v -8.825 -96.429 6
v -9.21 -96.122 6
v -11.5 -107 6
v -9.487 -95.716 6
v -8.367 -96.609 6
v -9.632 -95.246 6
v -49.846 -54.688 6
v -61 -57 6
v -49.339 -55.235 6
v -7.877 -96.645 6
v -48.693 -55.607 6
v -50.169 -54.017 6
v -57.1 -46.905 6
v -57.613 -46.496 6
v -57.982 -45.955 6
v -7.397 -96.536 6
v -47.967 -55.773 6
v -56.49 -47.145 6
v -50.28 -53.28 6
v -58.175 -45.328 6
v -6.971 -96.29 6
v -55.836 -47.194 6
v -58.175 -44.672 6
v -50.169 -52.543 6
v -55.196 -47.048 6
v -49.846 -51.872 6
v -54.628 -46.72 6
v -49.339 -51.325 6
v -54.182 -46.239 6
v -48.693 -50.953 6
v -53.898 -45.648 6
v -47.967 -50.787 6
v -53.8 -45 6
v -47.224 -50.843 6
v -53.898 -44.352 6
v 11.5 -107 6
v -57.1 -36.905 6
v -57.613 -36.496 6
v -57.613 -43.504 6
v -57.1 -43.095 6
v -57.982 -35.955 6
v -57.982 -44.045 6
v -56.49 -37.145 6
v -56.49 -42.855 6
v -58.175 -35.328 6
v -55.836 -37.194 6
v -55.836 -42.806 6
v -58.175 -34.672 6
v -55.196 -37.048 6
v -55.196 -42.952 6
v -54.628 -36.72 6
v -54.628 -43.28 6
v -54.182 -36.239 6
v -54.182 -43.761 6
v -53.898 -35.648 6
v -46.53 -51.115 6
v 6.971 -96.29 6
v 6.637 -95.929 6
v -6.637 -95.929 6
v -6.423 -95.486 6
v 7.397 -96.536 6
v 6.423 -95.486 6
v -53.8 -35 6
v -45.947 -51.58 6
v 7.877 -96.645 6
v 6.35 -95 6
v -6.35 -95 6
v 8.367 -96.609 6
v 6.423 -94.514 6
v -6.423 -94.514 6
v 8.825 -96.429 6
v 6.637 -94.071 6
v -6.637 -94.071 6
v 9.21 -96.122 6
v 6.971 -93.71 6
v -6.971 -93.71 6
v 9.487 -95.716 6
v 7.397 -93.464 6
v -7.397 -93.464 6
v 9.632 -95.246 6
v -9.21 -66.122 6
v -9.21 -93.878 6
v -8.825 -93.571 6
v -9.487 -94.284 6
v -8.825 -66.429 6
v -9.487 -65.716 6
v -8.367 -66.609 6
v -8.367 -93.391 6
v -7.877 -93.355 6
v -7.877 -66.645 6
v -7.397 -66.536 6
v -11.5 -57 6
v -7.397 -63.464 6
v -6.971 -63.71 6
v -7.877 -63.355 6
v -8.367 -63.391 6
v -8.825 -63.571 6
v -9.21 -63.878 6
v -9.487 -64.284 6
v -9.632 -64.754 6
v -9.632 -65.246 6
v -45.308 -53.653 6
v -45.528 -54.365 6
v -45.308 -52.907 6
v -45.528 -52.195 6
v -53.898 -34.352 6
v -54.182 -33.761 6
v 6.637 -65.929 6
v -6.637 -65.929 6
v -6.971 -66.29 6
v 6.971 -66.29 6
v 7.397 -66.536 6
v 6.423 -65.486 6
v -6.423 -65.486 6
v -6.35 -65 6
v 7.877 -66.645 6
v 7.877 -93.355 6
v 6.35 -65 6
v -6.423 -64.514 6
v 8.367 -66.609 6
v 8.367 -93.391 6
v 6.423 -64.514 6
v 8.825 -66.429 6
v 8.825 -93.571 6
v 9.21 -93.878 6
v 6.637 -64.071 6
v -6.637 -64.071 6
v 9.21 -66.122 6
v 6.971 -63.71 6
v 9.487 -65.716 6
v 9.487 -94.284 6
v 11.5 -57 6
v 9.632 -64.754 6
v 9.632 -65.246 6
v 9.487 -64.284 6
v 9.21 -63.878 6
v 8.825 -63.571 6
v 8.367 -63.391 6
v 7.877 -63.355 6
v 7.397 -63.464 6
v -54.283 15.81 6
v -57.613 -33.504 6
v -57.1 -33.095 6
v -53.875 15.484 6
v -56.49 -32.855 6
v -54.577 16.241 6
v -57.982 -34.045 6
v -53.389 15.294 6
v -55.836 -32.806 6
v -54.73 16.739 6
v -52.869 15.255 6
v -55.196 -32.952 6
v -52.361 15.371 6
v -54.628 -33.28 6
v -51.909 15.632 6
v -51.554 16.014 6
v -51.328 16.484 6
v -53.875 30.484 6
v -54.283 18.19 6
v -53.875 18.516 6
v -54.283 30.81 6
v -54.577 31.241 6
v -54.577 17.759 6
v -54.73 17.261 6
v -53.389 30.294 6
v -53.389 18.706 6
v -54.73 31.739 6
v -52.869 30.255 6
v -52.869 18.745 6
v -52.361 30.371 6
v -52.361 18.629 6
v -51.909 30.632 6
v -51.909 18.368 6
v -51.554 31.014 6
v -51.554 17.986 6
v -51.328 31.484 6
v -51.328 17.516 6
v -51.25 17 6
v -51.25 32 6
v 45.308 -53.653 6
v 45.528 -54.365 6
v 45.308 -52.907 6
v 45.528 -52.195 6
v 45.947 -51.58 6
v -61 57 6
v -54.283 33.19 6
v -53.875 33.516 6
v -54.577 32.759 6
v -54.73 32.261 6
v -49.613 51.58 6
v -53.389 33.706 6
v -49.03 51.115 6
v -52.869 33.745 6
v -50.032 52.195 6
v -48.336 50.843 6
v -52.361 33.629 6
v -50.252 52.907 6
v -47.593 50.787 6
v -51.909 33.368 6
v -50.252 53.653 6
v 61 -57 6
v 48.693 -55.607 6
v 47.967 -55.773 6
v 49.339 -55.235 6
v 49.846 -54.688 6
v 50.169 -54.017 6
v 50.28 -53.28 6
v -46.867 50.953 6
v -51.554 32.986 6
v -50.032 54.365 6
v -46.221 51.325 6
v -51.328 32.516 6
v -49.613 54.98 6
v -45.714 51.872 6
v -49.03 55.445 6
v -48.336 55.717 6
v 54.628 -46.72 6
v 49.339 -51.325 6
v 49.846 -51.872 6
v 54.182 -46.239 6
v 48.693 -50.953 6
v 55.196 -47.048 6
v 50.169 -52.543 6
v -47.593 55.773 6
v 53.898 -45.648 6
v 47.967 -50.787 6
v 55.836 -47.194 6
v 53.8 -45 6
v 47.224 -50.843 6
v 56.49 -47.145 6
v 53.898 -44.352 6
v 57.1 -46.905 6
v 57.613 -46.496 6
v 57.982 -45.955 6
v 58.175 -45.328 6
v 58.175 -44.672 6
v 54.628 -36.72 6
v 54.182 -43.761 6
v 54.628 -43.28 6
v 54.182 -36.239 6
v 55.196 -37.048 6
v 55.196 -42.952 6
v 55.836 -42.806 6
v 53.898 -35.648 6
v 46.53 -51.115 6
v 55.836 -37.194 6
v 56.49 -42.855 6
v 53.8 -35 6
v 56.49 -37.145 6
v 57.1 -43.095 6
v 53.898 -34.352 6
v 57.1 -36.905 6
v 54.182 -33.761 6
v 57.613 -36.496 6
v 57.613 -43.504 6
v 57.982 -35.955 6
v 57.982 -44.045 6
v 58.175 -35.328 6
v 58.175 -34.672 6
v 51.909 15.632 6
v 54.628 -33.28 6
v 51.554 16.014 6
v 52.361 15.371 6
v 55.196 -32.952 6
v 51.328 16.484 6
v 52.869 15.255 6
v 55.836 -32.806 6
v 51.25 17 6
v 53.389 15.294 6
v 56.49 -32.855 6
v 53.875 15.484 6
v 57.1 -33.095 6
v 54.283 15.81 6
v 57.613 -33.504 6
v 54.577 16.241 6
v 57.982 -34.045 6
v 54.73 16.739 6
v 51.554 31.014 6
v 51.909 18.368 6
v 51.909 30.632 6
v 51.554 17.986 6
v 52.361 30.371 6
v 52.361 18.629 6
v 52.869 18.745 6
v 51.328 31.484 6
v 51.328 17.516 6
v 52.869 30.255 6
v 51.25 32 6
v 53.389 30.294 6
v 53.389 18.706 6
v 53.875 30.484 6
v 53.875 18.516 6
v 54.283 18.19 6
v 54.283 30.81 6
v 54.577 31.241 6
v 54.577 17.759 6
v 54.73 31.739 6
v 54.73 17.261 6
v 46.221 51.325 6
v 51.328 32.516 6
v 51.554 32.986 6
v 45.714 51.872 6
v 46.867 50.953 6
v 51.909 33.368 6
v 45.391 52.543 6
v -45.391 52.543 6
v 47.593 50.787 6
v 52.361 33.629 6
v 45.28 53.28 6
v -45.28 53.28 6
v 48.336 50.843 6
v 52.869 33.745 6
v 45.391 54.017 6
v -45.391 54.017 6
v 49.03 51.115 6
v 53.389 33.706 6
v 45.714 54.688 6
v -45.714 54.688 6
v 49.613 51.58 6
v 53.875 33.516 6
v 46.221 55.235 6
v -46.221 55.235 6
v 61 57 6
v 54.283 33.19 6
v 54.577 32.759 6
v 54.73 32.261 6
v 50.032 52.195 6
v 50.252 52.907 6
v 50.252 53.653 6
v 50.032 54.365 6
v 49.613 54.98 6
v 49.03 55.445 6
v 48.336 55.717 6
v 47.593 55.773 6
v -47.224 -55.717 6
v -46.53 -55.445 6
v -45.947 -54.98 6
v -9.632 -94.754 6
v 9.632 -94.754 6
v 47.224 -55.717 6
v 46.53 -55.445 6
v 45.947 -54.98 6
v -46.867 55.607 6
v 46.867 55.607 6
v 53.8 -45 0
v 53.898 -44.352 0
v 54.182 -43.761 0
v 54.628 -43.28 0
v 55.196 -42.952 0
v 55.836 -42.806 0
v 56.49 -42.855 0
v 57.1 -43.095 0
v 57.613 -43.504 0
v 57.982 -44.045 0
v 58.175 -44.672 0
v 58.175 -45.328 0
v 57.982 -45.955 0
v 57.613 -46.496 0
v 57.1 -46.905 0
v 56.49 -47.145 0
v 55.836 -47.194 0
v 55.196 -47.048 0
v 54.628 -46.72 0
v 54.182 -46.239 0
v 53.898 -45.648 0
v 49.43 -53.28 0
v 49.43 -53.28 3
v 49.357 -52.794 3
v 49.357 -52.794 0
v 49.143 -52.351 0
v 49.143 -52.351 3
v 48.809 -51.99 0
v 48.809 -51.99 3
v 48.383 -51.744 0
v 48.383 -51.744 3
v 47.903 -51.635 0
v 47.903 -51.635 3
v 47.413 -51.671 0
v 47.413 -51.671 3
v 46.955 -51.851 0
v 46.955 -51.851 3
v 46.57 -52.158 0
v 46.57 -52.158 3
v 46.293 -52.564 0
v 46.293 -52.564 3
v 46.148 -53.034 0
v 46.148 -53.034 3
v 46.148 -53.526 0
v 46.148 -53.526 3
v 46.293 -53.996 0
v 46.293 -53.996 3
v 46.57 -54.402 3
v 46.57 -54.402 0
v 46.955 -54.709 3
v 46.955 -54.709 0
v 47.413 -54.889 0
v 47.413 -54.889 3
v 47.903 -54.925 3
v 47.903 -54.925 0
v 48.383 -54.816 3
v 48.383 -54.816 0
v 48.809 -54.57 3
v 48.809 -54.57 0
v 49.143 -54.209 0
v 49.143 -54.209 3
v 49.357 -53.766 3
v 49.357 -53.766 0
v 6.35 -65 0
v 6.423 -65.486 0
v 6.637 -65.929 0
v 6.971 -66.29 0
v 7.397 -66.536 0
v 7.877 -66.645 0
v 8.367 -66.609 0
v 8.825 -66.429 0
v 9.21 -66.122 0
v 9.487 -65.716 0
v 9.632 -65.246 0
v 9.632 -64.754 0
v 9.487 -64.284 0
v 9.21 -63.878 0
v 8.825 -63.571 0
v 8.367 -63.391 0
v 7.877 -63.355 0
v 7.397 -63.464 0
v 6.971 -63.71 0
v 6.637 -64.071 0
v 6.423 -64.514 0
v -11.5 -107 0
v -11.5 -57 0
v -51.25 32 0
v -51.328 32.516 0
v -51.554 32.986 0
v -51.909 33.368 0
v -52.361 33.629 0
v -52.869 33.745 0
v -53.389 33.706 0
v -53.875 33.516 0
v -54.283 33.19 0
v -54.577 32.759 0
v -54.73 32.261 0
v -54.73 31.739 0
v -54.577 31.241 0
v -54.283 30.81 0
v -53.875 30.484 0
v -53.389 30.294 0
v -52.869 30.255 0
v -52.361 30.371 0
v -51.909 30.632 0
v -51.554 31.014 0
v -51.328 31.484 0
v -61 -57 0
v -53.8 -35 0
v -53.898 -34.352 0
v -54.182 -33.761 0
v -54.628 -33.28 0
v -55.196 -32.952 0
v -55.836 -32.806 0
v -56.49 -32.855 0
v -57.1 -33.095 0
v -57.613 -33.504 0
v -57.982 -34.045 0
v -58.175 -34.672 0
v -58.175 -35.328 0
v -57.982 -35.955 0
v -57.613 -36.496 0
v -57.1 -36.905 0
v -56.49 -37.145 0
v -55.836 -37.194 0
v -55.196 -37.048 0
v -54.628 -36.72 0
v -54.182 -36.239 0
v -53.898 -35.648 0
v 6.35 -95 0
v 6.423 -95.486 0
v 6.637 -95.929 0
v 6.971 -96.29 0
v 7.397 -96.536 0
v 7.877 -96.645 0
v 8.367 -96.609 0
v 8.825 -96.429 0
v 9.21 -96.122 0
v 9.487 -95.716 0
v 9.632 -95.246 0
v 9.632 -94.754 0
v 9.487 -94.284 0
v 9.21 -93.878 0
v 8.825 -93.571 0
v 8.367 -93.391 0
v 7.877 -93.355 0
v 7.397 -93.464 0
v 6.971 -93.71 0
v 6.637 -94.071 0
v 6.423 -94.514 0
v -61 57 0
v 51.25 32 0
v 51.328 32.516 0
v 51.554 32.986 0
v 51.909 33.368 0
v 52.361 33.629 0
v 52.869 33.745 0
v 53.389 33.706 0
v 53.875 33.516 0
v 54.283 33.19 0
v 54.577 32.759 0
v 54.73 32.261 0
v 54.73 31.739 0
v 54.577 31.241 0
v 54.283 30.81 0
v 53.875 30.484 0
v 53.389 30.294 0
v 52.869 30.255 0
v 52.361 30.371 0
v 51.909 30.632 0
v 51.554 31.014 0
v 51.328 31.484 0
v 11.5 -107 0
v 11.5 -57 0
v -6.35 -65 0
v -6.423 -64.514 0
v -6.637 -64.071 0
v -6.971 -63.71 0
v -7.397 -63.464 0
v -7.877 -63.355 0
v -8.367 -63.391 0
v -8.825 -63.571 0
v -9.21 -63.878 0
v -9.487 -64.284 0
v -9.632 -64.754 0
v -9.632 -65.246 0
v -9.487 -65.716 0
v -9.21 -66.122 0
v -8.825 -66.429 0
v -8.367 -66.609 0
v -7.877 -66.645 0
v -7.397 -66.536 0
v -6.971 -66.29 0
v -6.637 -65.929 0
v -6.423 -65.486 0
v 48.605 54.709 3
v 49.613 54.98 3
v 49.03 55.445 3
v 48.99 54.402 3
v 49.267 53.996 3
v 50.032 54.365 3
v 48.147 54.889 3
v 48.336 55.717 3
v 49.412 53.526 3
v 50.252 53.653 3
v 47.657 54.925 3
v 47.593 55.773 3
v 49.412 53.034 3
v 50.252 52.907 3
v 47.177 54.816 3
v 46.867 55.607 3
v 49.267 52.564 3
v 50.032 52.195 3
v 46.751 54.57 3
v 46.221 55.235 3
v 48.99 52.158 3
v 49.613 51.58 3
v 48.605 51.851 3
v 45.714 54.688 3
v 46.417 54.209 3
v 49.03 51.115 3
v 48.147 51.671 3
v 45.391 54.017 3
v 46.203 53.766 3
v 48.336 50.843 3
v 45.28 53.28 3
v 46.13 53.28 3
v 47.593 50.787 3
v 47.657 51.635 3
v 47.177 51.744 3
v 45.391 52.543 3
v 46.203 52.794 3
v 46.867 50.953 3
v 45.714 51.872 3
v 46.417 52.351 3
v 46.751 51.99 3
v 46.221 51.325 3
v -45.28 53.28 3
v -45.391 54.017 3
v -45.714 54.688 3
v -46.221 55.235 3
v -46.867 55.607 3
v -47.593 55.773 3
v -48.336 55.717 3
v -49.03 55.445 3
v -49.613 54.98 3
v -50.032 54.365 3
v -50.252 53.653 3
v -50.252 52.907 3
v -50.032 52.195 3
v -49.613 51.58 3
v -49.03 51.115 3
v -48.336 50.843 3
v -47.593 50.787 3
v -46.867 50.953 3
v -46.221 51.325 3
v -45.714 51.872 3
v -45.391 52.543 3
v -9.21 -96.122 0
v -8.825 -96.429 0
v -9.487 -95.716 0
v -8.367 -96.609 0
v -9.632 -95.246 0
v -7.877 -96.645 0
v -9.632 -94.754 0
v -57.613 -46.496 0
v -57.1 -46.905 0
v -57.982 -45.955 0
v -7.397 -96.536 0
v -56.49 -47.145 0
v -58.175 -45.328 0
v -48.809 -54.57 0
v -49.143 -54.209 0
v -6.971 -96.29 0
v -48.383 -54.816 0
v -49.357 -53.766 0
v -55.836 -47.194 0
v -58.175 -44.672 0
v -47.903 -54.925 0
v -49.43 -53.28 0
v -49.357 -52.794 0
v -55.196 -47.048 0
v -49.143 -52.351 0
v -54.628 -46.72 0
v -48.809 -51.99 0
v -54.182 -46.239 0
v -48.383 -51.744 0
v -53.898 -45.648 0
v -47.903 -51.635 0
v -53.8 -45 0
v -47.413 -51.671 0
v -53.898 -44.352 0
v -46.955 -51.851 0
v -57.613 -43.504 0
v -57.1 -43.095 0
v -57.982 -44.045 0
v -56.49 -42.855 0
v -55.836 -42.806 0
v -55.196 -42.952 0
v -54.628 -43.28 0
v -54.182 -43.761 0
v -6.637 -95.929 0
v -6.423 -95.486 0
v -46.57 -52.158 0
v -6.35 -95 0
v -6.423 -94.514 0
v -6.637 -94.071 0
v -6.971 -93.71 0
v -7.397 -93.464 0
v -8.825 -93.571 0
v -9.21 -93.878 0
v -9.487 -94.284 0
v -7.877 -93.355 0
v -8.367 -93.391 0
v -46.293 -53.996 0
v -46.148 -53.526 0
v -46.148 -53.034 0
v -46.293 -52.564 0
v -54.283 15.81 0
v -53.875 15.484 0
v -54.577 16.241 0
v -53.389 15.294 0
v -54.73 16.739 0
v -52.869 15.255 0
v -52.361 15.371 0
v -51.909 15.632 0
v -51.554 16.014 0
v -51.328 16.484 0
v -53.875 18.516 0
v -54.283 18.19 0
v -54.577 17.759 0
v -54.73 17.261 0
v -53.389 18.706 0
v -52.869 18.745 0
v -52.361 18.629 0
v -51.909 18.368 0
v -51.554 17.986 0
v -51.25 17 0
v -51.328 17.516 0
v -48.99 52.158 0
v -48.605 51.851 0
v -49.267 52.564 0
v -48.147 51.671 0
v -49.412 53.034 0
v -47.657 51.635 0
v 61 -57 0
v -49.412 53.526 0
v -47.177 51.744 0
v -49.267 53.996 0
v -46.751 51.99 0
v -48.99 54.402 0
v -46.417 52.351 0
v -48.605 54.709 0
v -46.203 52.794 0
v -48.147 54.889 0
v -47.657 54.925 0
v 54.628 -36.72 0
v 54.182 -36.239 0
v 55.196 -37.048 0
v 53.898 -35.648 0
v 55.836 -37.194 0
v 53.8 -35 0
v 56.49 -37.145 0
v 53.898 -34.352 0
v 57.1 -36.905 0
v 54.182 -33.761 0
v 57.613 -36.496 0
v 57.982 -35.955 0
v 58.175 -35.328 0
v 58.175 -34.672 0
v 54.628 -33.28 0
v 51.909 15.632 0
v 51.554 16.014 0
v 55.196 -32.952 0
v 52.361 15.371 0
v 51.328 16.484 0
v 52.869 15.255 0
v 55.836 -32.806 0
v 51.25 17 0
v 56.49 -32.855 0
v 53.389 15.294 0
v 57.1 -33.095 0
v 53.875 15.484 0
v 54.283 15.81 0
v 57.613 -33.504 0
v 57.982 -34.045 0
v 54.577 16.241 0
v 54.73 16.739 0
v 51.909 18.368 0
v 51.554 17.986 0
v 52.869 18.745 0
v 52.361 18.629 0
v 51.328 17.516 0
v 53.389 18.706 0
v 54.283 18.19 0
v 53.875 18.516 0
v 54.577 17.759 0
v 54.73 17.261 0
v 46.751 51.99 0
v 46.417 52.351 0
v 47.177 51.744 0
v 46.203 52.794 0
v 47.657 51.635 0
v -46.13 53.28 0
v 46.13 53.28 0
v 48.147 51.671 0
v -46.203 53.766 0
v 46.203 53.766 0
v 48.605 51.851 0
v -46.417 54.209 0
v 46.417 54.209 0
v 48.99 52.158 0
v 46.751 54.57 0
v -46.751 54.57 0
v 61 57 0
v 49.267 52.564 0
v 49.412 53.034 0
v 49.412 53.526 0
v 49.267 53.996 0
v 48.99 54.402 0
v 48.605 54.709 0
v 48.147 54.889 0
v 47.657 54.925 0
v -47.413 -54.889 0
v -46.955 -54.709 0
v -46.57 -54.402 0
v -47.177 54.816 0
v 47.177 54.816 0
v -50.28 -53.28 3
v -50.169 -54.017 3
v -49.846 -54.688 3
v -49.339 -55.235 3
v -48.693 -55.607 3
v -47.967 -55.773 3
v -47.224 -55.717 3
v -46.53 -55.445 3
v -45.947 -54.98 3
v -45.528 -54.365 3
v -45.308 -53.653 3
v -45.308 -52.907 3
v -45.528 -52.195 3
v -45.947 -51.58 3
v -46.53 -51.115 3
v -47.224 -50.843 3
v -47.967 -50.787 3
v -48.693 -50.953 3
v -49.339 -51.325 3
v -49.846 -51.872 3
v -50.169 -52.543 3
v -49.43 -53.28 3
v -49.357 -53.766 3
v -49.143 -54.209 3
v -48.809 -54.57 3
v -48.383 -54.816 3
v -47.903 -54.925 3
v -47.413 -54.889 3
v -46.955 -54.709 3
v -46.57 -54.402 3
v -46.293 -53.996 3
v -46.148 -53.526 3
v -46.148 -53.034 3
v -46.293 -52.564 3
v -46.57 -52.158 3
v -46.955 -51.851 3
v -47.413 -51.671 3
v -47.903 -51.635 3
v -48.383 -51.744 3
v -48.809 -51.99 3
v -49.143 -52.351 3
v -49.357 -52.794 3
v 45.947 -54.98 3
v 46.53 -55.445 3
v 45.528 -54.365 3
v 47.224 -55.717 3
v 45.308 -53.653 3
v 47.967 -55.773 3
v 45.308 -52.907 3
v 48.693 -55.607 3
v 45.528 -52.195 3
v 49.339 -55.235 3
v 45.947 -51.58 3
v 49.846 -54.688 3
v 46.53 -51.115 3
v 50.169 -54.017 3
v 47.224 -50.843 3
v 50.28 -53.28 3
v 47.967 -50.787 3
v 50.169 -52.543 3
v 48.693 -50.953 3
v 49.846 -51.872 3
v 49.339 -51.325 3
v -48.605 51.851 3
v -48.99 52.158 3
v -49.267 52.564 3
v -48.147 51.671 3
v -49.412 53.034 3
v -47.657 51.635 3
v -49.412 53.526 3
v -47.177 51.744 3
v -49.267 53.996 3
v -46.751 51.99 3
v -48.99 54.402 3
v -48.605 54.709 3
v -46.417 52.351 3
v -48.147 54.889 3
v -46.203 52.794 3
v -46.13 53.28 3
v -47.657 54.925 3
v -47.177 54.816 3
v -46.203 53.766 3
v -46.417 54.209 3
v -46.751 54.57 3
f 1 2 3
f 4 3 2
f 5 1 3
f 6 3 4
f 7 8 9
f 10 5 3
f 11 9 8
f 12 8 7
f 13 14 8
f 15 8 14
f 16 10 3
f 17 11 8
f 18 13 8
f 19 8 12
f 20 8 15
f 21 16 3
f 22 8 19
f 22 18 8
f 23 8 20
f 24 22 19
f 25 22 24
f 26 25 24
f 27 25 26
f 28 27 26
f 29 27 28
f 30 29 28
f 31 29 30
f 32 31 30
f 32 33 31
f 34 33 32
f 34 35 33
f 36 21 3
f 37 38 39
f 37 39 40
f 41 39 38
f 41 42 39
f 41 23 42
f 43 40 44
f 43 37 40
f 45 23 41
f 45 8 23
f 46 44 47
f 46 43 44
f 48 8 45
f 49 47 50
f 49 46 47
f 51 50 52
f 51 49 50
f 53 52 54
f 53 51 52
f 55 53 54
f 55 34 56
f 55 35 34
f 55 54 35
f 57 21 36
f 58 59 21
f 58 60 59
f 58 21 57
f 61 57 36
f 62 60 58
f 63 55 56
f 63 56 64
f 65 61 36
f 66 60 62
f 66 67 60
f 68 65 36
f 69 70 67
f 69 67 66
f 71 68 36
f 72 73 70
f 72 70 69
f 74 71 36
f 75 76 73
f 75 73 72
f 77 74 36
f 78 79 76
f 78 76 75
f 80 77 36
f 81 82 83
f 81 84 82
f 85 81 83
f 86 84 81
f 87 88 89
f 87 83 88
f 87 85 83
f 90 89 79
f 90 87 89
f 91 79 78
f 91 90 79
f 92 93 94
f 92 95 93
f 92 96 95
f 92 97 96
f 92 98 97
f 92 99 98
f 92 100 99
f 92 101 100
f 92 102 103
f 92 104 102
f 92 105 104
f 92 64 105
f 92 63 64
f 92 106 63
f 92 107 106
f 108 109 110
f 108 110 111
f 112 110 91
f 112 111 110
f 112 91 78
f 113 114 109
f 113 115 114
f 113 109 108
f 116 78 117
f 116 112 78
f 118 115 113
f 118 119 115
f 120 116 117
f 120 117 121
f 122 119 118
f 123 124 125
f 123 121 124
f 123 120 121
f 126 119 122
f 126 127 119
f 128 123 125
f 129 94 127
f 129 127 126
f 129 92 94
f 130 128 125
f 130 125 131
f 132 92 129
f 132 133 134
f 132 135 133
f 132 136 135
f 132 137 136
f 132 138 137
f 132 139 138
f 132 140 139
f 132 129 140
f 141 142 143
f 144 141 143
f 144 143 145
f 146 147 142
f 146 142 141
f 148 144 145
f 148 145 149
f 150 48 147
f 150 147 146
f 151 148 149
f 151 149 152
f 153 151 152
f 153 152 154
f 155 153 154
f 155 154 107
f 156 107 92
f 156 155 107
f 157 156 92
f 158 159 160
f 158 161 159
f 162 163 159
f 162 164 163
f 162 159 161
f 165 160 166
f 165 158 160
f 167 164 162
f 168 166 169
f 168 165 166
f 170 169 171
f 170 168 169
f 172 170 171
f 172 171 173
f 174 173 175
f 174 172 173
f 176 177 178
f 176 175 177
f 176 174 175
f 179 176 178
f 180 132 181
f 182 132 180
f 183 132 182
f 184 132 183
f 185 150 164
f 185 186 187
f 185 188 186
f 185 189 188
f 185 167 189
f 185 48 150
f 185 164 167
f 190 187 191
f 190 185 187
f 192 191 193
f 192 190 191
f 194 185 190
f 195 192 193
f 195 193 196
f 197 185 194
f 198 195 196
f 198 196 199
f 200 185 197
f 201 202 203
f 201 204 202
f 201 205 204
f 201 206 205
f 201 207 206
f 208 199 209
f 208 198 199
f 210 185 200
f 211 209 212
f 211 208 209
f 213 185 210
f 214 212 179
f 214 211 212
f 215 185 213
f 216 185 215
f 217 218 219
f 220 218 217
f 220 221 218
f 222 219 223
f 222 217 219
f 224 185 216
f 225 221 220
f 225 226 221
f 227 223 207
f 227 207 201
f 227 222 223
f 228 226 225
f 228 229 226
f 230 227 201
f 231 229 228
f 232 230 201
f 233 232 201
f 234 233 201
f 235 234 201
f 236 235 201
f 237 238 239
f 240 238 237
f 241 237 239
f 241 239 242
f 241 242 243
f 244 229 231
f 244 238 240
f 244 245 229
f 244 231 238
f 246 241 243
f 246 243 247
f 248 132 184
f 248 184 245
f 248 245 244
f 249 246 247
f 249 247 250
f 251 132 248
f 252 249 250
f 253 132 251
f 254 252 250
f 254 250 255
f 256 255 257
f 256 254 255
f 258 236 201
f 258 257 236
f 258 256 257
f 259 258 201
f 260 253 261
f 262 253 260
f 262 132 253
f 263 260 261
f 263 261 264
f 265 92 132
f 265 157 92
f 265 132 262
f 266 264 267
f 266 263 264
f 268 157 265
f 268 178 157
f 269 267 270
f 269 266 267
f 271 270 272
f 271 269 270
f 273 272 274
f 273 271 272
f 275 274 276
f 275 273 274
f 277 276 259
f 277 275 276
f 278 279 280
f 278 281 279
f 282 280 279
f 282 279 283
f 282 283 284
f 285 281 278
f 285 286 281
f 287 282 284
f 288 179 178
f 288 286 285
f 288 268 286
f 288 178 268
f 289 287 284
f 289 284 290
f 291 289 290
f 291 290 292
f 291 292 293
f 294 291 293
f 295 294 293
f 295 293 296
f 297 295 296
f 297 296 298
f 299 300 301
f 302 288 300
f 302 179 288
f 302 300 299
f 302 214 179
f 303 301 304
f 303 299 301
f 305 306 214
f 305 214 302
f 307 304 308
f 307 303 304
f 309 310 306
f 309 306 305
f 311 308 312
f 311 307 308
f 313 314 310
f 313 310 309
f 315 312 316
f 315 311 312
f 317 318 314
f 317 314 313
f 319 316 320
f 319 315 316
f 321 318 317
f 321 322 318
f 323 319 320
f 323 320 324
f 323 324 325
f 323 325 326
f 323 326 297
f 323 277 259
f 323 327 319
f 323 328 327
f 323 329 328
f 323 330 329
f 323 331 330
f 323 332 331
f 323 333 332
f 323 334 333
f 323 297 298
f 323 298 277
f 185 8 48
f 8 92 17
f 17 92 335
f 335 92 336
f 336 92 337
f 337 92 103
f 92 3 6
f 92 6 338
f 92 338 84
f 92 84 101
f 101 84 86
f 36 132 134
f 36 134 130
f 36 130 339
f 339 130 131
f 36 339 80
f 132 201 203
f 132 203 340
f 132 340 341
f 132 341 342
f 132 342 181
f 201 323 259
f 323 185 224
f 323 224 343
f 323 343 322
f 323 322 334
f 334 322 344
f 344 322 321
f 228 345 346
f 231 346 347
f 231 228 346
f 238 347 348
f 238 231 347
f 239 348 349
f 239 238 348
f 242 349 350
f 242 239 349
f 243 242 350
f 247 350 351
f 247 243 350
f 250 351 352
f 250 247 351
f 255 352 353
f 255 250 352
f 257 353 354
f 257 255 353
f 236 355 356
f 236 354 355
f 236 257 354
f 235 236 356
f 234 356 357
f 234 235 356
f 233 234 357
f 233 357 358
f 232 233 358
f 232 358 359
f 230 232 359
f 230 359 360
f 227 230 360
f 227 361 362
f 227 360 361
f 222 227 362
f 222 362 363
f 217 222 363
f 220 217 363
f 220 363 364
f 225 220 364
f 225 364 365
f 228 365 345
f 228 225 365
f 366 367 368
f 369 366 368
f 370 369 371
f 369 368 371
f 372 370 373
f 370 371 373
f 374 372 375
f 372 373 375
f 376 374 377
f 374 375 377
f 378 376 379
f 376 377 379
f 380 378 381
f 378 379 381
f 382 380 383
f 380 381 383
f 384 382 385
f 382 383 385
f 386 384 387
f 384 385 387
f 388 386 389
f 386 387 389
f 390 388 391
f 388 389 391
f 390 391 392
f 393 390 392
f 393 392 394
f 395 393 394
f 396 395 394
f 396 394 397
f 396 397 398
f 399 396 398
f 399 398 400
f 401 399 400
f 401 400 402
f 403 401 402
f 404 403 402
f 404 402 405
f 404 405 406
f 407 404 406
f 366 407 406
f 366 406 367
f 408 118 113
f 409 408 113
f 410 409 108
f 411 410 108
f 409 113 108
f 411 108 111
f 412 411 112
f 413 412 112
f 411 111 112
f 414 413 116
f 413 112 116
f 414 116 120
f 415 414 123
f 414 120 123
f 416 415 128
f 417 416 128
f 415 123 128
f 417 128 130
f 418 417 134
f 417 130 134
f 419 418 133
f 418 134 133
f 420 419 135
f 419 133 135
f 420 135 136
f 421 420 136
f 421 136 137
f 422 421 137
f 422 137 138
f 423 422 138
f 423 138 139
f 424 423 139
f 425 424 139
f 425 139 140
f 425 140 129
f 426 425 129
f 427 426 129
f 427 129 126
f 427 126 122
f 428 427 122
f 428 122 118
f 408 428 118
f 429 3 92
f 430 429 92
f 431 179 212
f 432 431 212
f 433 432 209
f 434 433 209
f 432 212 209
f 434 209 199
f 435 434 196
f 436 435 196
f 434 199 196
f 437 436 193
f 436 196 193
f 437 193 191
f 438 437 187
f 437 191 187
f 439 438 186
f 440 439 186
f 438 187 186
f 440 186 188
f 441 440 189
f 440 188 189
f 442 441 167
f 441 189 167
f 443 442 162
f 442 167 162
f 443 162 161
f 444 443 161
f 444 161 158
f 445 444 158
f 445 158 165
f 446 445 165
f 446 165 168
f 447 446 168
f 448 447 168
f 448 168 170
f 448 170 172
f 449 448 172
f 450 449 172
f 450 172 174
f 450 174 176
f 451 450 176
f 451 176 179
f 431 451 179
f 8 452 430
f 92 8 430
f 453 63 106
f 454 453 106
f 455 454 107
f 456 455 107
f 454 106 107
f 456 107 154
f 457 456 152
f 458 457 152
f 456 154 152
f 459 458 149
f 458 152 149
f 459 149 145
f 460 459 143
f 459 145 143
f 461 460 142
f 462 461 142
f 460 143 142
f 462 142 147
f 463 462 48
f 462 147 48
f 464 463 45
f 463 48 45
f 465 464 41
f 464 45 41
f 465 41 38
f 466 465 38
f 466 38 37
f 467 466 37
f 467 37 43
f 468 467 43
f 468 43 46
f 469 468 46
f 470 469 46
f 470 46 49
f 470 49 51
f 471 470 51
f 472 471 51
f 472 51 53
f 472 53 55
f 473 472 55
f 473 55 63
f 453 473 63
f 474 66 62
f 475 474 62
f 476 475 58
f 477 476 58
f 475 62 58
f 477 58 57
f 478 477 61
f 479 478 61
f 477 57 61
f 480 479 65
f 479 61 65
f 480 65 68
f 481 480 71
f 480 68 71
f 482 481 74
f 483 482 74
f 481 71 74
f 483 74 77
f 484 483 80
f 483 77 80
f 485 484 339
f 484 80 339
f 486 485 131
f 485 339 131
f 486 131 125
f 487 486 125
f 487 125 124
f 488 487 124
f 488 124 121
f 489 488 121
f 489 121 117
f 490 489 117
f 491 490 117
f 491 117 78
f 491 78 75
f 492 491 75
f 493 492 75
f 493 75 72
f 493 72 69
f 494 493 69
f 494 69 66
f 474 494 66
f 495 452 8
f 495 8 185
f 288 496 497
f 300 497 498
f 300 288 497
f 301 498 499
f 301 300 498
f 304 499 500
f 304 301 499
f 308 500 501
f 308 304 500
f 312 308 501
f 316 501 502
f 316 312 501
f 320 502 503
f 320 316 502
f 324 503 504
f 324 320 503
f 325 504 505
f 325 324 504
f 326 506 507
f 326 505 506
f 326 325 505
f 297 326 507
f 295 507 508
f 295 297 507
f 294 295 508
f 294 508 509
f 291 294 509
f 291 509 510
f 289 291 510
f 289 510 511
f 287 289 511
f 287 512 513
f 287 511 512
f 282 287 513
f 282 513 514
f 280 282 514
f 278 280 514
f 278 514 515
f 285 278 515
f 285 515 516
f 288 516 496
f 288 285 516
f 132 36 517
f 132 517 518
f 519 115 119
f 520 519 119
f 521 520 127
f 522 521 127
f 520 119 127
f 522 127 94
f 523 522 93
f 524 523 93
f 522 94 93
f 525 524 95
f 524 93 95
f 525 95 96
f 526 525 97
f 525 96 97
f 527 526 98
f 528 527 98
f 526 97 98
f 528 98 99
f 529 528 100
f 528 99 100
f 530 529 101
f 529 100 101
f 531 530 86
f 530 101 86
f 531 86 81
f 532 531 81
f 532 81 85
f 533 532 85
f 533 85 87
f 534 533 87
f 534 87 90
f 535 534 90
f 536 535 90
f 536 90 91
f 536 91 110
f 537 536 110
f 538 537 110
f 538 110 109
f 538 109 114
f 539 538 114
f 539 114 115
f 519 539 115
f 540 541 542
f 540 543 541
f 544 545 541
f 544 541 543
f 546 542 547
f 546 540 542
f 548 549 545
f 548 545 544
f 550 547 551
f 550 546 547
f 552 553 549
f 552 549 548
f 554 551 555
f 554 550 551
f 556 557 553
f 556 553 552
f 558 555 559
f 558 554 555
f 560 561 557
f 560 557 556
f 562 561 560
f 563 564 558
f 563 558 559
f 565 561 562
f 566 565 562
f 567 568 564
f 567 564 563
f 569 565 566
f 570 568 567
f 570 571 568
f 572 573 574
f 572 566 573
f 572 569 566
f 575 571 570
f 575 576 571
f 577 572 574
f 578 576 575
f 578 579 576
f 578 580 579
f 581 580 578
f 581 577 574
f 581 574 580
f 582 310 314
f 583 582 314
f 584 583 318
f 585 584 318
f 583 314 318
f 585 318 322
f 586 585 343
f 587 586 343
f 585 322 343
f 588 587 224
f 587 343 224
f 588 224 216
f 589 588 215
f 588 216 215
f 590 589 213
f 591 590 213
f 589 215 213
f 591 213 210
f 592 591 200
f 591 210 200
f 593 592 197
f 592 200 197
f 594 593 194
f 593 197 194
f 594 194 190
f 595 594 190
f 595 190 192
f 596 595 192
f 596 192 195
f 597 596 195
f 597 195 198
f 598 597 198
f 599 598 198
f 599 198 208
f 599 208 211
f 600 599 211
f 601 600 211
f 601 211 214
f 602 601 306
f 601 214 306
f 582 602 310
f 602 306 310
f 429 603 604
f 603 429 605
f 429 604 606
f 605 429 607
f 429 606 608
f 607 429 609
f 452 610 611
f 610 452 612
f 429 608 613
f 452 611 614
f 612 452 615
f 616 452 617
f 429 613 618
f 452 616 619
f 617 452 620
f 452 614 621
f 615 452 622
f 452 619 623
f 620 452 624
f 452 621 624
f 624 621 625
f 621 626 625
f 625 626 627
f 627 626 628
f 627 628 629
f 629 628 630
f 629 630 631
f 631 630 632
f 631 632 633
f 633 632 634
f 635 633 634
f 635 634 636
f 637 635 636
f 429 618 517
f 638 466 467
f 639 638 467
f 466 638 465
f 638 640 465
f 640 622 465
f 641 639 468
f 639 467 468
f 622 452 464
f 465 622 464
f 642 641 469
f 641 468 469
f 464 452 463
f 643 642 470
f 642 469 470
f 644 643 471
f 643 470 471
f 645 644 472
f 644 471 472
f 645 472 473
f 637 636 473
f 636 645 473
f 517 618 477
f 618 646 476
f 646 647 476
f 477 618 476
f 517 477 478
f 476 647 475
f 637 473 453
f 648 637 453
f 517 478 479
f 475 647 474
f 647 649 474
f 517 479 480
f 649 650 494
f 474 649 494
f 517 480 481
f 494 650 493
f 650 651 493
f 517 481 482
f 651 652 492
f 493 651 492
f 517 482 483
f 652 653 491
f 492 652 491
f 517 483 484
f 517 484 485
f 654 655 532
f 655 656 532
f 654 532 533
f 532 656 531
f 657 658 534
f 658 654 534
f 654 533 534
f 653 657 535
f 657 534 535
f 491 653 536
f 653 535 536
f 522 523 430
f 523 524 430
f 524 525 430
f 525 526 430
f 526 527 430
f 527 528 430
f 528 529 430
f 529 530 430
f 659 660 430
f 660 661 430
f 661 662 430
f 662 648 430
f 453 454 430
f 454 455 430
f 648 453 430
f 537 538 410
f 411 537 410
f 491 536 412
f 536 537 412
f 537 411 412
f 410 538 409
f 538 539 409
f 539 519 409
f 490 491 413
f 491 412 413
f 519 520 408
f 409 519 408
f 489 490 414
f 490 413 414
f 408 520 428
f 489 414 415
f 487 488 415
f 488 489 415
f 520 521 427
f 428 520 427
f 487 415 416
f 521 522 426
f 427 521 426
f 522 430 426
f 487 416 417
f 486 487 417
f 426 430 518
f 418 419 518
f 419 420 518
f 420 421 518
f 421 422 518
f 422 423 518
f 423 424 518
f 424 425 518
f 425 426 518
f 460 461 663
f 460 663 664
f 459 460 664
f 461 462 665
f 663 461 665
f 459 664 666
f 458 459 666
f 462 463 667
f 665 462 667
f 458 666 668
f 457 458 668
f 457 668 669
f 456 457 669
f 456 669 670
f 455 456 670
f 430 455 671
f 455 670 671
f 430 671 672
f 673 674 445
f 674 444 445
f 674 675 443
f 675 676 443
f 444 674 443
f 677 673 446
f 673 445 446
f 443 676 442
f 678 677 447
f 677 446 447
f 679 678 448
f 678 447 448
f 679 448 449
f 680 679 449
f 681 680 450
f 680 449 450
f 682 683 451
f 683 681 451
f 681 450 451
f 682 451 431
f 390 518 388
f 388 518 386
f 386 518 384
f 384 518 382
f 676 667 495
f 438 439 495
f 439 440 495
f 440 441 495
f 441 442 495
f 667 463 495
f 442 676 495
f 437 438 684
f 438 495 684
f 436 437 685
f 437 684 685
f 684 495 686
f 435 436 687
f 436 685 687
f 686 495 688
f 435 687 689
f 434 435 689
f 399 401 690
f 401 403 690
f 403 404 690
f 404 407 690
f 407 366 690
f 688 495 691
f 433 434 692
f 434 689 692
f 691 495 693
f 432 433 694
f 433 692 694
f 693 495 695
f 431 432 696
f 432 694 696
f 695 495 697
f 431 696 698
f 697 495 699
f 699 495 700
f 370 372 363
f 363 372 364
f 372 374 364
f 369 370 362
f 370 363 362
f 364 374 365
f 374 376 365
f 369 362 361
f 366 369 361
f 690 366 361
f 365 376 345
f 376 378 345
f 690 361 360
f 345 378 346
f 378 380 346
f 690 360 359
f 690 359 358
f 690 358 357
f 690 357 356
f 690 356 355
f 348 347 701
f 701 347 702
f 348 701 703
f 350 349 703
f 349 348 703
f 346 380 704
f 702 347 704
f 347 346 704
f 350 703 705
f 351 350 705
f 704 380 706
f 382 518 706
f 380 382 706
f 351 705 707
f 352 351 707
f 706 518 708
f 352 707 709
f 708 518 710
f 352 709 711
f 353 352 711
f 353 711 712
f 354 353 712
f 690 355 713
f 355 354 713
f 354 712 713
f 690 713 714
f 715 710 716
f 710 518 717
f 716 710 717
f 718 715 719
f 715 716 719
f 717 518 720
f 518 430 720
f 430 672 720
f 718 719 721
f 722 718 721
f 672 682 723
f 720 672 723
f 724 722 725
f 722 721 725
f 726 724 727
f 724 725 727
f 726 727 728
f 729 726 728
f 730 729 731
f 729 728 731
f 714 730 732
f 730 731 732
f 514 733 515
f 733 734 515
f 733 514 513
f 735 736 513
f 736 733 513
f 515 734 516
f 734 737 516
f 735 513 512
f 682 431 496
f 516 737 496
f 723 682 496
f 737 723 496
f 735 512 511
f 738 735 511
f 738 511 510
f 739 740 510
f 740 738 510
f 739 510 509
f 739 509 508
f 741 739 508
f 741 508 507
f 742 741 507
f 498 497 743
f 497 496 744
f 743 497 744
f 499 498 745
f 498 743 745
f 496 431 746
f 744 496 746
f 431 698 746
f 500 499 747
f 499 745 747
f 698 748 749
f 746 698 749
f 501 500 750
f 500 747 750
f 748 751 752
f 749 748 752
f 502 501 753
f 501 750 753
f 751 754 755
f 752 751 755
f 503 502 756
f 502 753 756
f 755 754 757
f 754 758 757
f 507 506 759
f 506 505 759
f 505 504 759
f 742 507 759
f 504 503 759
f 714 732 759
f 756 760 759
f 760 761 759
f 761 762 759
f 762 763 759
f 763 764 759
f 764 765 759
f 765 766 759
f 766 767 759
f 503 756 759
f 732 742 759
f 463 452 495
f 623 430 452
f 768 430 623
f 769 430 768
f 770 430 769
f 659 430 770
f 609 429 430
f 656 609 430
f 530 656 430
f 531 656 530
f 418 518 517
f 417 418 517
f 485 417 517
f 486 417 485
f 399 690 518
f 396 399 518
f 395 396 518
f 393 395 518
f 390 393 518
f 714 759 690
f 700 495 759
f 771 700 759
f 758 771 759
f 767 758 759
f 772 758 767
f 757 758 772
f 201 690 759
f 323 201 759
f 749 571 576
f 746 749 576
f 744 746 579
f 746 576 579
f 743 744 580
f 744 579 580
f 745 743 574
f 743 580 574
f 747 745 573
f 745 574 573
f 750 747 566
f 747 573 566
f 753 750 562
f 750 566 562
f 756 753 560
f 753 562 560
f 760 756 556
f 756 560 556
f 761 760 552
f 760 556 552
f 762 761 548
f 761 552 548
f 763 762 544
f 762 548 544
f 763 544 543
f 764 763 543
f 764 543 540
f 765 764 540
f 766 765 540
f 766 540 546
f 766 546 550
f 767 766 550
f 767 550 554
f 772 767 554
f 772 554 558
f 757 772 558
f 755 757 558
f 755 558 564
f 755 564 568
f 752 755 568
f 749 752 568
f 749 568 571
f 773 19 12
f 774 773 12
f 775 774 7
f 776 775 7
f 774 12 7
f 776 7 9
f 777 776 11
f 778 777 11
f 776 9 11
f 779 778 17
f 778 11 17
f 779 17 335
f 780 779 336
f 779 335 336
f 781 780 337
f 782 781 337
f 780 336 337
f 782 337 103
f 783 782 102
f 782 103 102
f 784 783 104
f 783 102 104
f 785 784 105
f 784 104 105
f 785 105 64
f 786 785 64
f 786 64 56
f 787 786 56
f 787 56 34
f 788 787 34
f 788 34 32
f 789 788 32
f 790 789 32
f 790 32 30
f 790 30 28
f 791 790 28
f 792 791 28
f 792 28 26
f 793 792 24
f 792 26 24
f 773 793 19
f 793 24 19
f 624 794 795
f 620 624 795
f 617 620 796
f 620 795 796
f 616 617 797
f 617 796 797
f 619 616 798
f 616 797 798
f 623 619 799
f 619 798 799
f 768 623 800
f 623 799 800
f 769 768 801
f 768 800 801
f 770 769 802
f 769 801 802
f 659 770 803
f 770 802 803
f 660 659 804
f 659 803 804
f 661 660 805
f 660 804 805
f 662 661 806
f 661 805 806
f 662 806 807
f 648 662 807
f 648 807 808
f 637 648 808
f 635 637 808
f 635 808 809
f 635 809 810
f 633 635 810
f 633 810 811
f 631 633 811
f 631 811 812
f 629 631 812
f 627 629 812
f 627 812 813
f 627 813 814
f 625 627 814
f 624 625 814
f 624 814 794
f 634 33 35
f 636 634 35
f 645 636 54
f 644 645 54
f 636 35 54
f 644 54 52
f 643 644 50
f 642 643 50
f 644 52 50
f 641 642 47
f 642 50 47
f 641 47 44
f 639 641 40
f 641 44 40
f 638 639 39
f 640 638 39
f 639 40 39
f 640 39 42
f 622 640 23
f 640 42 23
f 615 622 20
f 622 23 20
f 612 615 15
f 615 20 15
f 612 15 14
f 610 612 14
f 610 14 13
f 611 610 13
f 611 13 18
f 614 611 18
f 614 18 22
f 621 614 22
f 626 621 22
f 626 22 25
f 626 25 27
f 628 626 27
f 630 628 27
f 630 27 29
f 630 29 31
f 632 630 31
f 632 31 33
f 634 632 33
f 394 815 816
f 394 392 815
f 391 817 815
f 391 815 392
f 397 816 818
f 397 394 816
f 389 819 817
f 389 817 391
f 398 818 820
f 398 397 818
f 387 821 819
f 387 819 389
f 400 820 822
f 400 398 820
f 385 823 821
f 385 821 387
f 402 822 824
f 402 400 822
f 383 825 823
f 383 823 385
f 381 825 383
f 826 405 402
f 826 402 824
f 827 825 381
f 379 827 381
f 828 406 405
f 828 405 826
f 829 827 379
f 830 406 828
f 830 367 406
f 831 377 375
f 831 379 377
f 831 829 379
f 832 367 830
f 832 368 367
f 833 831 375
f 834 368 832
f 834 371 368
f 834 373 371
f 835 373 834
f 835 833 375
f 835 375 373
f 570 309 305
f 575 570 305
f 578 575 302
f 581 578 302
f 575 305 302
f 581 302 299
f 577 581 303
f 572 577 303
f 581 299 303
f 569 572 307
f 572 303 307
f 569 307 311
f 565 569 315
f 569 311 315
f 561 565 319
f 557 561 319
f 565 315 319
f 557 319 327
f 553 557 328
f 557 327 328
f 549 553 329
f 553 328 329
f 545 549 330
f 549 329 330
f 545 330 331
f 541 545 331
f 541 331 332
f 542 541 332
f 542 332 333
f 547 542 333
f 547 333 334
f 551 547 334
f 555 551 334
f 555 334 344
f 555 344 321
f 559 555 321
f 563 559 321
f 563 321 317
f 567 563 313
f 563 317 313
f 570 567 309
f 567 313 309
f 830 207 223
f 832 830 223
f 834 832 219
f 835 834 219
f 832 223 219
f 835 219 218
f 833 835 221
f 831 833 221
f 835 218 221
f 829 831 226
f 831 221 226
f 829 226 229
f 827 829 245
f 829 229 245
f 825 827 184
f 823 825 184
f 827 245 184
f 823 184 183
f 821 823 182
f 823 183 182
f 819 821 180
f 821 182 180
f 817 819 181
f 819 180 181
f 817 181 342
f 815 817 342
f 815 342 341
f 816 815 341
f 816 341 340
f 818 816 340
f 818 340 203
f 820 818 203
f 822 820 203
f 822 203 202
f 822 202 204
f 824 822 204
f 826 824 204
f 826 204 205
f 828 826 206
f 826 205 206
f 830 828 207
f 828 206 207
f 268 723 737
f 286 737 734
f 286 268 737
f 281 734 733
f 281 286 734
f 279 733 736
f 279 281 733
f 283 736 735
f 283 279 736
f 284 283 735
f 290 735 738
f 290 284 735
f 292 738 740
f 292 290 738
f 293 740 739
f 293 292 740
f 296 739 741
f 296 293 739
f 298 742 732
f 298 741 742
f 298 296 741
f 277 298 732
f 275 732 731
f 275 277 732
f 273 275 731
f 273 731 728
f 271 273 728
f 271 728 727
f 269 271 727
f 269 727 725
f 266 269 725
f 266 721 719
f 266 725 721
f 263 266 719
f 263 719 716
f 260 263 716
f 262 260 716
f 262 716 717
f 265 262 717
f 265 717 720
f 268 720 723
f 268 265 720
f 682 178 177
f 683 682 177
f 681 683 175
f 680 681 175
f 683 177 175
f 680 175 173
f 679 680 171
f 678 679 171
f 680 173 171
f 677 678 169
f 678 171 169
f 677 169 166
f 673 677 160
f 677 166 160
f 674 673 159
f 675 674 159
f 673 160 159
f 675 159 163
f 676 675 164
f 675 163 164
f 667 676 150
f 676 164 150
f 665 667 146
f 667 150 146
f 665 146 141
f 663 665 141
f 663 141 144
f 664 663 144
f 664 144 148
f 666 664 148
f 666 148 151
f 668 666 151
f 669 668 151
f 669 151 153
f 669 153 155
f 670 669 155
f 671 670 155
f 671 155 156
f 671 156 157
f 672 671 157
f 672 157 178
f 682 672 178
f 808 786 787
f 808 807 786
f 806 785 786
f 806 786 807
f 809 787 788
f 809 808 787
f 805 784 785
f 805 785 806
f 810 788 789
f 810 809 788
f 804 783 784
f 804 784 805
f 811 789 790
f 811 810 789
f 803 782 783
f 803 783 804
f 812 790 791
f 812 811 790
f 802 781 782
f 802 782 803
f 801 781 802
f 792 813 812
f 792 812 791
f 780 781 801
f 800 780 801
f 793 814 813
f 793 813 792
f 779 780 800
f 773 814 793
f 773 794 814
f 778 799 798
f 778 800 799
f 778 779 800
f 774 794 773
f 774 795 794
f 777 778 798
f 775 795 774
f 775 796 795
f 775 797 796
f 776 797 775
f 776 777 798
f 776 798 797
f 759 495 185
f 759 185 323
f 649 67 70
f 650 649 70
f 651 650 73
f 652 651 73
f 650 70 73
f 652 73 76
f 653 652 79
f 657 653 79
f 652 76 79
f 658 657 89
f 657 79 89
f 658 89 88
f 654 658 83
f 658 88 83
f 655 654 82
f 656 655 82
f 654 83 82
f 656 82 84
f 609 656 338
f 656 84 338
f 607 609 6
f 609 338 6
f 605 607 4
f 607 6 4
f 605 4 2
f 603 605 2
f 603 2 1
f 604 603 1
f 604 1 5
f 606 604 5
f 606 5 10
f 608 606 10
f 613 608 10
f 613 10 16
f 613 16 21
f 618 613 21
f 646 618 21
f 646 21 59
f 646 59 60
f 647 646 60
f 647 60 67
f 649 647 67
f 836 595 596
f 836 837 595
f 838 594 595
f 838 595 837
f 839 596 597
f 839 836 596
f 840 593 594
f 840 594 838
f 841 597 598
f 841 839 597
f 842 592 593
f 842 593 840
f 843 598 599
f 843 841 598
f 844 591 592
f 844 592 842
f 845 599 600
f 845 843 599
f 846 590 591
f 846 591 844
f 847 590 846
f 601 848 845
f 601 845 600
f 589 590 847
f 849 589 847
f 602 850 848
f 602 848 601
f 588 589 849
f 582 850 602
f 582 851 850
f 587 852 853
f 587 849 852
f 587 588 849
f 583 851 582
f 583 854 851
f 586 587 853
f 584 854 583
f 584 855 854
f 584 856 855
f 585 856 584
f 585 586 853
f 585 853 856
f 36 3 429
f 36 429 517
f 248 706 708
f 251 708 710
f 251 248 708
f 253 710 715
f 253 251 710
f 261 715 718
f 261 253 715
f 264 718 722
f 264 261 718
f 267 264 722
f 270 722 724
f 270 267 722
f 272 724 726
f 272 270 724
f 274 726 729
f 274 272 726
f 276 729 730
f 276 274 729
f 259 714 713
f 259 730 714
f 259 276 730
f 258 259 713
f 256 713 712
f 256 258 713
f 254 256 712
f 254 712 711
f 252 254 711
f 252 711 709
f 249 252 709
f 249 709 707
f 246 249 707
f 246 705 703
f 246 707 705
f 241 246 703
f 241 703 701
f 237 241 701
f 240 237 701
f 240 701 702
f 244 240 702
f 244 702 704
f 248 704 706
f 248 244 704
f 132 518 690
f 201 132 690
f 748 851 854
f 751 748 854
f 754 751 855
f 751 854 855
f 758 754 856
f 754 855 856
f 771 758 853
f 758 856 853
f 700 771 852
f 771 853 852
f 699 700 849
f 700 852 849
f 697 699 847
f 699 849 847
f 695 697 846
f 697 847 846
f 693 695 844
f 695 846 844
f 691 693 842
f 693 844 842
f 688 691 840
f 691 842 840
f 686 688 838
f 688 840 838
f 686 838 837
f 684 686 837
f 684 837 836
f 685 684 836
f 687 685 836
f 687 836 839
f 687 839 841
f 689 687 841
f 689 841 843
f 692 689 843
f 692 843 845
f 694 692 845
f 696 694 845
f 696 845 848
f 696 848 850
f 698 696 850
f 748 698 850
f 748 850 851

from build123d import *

# Parameters (mm, degrees)
SKETCH1_W           = 122
SKETCH1_H           = 114
BOSS_EXTRUDE1_DEPTH = 6
SKETCH2_R           = 1.65
CUT_EXTRUDE1_DEPTH  = 6
SKETCH3_R           = 2.5
CUT_EXTRUDE2_DEPTH  = 3
SKETCH4_R           = 1.75
SKETCH4_R_2         = 2.2
CUT_EXTRUDE3_DEPTH  = 84.701851831
SKETCH5_W           = 23
SKETCH5_H           = 50
BOSS_EXTRUDE2_DEPTH = 6
SKETCH6_R           = 1.65
CUT_EXTRUDE4_DEPTH  = 124.312610872


with BuildPart() as part:
    # Sketch1 → Boss-Extrude1 (new body)
    with BuildSketch(Plane.XY):
        Rectangle(SKETCH1_W, SKETCH1_H)
    extrude(amount=BOSS_EXTRUDE1_DEPTH)

    # Sketch2 → Cut-Extrude1 (cut)
    with BuildSketch(Plane.XY.offset(6)):
        with Locations((-47.78, 53.28)):
            Circle(SKETCH2_R)
        with Locations(Location((47.78, 53.28, 0), (0, 0, 180))):
            Circle(SKETCH2_R)
        with Locations((47.78, -53.28)):
            Circle(SKETCH2_R)
        with Locations(Location((-47.78, -53.28, 0), (0, 0, 180))):
            Circle(SKETCH2_R)
    extrude(amount=-CUT_EXTRUDE1_DEPTH, mode=Mode.SUBTRACT)

    # Sketch3 → Cut-Extrude2 (cut)
    with BuildSketch(Plane.XY.offset(6)):
        with Locations((-47.78, 53.28)):
            Circle(SKETCH3_R)
        with Locations(Location((47.78, 53.28, 0), (0, 0, 180))):
            Circle(SKETCH3_R)
        with Locations((47.78, -53.28)):
            Circle(SKETCH3_R)
        with Locations(Location((-47.78, -53.28, 0), (0, 0, 180))):
            Circle(SKETCH3_R)
    extrude(amount=-CUT_EXTRUDE2_DEPTH, mode=Mode.SUBTRACT)

    # Sketch4 → Cut-Extrude3 (cut, through all)
    with BuildSketch(Plane.XY.offset(6)):
        with Locations((-53, 32)):
            Circle(SKETCH4_R)
        with Locations((-53, 17)):
            Circle(SKETCH4_R)
        with Locations((-56, -35)):
            Circle(SKETCH4_R_2)
        with Locations((-56, -45)):
            Circle(SKETCH4_R_2)
    cut_extrude3 = extrude(amount=-CUT_EXTRUDE3_DEPTH, mode=Mode.SUBTRACT)

    # Mirror1: Cut-Extrude3 across plane
    add(cut_extrude3.mirror(Plane(origin=(0, 0, 0), x_dir=(0, 0, 1), z_dir=(1, 0, 0))), mode=Mode.SUBTRACT)

    # Sketch5 → Boss-Extrude2 (add, through all)
    with BuildSketch(Plane.XY.offset(6)):
        with Locations((0, -82)):
            Rectangle(SKETCH5_W, SKETCH5_H)
    extrude(amount=-BOSS_EXTRUDE2_DEPTH)

    # Sketch6 → Cut-Extrude4 (cut, through all)
    with BuildSketch(Plane.XY.offset(6)):
        with Locations((-8, -65)):
            Circle(SKETCH6_R)
        with Locations((-8, -95)):
            Circle(SKETCH6_R)
        with Locations(Location((8, -95, 0), (0, 0, 180))):
            Circle(SKETCH6_R)
        with Locations(Location((8, -65, 0), (0, 0, 180))):
            Circle(SKETCH6_R)
    extrude(amount=-CUT_EXTRUDE4_DEPTH, mode=Mode.SUBTRACT)


solid = part.part
